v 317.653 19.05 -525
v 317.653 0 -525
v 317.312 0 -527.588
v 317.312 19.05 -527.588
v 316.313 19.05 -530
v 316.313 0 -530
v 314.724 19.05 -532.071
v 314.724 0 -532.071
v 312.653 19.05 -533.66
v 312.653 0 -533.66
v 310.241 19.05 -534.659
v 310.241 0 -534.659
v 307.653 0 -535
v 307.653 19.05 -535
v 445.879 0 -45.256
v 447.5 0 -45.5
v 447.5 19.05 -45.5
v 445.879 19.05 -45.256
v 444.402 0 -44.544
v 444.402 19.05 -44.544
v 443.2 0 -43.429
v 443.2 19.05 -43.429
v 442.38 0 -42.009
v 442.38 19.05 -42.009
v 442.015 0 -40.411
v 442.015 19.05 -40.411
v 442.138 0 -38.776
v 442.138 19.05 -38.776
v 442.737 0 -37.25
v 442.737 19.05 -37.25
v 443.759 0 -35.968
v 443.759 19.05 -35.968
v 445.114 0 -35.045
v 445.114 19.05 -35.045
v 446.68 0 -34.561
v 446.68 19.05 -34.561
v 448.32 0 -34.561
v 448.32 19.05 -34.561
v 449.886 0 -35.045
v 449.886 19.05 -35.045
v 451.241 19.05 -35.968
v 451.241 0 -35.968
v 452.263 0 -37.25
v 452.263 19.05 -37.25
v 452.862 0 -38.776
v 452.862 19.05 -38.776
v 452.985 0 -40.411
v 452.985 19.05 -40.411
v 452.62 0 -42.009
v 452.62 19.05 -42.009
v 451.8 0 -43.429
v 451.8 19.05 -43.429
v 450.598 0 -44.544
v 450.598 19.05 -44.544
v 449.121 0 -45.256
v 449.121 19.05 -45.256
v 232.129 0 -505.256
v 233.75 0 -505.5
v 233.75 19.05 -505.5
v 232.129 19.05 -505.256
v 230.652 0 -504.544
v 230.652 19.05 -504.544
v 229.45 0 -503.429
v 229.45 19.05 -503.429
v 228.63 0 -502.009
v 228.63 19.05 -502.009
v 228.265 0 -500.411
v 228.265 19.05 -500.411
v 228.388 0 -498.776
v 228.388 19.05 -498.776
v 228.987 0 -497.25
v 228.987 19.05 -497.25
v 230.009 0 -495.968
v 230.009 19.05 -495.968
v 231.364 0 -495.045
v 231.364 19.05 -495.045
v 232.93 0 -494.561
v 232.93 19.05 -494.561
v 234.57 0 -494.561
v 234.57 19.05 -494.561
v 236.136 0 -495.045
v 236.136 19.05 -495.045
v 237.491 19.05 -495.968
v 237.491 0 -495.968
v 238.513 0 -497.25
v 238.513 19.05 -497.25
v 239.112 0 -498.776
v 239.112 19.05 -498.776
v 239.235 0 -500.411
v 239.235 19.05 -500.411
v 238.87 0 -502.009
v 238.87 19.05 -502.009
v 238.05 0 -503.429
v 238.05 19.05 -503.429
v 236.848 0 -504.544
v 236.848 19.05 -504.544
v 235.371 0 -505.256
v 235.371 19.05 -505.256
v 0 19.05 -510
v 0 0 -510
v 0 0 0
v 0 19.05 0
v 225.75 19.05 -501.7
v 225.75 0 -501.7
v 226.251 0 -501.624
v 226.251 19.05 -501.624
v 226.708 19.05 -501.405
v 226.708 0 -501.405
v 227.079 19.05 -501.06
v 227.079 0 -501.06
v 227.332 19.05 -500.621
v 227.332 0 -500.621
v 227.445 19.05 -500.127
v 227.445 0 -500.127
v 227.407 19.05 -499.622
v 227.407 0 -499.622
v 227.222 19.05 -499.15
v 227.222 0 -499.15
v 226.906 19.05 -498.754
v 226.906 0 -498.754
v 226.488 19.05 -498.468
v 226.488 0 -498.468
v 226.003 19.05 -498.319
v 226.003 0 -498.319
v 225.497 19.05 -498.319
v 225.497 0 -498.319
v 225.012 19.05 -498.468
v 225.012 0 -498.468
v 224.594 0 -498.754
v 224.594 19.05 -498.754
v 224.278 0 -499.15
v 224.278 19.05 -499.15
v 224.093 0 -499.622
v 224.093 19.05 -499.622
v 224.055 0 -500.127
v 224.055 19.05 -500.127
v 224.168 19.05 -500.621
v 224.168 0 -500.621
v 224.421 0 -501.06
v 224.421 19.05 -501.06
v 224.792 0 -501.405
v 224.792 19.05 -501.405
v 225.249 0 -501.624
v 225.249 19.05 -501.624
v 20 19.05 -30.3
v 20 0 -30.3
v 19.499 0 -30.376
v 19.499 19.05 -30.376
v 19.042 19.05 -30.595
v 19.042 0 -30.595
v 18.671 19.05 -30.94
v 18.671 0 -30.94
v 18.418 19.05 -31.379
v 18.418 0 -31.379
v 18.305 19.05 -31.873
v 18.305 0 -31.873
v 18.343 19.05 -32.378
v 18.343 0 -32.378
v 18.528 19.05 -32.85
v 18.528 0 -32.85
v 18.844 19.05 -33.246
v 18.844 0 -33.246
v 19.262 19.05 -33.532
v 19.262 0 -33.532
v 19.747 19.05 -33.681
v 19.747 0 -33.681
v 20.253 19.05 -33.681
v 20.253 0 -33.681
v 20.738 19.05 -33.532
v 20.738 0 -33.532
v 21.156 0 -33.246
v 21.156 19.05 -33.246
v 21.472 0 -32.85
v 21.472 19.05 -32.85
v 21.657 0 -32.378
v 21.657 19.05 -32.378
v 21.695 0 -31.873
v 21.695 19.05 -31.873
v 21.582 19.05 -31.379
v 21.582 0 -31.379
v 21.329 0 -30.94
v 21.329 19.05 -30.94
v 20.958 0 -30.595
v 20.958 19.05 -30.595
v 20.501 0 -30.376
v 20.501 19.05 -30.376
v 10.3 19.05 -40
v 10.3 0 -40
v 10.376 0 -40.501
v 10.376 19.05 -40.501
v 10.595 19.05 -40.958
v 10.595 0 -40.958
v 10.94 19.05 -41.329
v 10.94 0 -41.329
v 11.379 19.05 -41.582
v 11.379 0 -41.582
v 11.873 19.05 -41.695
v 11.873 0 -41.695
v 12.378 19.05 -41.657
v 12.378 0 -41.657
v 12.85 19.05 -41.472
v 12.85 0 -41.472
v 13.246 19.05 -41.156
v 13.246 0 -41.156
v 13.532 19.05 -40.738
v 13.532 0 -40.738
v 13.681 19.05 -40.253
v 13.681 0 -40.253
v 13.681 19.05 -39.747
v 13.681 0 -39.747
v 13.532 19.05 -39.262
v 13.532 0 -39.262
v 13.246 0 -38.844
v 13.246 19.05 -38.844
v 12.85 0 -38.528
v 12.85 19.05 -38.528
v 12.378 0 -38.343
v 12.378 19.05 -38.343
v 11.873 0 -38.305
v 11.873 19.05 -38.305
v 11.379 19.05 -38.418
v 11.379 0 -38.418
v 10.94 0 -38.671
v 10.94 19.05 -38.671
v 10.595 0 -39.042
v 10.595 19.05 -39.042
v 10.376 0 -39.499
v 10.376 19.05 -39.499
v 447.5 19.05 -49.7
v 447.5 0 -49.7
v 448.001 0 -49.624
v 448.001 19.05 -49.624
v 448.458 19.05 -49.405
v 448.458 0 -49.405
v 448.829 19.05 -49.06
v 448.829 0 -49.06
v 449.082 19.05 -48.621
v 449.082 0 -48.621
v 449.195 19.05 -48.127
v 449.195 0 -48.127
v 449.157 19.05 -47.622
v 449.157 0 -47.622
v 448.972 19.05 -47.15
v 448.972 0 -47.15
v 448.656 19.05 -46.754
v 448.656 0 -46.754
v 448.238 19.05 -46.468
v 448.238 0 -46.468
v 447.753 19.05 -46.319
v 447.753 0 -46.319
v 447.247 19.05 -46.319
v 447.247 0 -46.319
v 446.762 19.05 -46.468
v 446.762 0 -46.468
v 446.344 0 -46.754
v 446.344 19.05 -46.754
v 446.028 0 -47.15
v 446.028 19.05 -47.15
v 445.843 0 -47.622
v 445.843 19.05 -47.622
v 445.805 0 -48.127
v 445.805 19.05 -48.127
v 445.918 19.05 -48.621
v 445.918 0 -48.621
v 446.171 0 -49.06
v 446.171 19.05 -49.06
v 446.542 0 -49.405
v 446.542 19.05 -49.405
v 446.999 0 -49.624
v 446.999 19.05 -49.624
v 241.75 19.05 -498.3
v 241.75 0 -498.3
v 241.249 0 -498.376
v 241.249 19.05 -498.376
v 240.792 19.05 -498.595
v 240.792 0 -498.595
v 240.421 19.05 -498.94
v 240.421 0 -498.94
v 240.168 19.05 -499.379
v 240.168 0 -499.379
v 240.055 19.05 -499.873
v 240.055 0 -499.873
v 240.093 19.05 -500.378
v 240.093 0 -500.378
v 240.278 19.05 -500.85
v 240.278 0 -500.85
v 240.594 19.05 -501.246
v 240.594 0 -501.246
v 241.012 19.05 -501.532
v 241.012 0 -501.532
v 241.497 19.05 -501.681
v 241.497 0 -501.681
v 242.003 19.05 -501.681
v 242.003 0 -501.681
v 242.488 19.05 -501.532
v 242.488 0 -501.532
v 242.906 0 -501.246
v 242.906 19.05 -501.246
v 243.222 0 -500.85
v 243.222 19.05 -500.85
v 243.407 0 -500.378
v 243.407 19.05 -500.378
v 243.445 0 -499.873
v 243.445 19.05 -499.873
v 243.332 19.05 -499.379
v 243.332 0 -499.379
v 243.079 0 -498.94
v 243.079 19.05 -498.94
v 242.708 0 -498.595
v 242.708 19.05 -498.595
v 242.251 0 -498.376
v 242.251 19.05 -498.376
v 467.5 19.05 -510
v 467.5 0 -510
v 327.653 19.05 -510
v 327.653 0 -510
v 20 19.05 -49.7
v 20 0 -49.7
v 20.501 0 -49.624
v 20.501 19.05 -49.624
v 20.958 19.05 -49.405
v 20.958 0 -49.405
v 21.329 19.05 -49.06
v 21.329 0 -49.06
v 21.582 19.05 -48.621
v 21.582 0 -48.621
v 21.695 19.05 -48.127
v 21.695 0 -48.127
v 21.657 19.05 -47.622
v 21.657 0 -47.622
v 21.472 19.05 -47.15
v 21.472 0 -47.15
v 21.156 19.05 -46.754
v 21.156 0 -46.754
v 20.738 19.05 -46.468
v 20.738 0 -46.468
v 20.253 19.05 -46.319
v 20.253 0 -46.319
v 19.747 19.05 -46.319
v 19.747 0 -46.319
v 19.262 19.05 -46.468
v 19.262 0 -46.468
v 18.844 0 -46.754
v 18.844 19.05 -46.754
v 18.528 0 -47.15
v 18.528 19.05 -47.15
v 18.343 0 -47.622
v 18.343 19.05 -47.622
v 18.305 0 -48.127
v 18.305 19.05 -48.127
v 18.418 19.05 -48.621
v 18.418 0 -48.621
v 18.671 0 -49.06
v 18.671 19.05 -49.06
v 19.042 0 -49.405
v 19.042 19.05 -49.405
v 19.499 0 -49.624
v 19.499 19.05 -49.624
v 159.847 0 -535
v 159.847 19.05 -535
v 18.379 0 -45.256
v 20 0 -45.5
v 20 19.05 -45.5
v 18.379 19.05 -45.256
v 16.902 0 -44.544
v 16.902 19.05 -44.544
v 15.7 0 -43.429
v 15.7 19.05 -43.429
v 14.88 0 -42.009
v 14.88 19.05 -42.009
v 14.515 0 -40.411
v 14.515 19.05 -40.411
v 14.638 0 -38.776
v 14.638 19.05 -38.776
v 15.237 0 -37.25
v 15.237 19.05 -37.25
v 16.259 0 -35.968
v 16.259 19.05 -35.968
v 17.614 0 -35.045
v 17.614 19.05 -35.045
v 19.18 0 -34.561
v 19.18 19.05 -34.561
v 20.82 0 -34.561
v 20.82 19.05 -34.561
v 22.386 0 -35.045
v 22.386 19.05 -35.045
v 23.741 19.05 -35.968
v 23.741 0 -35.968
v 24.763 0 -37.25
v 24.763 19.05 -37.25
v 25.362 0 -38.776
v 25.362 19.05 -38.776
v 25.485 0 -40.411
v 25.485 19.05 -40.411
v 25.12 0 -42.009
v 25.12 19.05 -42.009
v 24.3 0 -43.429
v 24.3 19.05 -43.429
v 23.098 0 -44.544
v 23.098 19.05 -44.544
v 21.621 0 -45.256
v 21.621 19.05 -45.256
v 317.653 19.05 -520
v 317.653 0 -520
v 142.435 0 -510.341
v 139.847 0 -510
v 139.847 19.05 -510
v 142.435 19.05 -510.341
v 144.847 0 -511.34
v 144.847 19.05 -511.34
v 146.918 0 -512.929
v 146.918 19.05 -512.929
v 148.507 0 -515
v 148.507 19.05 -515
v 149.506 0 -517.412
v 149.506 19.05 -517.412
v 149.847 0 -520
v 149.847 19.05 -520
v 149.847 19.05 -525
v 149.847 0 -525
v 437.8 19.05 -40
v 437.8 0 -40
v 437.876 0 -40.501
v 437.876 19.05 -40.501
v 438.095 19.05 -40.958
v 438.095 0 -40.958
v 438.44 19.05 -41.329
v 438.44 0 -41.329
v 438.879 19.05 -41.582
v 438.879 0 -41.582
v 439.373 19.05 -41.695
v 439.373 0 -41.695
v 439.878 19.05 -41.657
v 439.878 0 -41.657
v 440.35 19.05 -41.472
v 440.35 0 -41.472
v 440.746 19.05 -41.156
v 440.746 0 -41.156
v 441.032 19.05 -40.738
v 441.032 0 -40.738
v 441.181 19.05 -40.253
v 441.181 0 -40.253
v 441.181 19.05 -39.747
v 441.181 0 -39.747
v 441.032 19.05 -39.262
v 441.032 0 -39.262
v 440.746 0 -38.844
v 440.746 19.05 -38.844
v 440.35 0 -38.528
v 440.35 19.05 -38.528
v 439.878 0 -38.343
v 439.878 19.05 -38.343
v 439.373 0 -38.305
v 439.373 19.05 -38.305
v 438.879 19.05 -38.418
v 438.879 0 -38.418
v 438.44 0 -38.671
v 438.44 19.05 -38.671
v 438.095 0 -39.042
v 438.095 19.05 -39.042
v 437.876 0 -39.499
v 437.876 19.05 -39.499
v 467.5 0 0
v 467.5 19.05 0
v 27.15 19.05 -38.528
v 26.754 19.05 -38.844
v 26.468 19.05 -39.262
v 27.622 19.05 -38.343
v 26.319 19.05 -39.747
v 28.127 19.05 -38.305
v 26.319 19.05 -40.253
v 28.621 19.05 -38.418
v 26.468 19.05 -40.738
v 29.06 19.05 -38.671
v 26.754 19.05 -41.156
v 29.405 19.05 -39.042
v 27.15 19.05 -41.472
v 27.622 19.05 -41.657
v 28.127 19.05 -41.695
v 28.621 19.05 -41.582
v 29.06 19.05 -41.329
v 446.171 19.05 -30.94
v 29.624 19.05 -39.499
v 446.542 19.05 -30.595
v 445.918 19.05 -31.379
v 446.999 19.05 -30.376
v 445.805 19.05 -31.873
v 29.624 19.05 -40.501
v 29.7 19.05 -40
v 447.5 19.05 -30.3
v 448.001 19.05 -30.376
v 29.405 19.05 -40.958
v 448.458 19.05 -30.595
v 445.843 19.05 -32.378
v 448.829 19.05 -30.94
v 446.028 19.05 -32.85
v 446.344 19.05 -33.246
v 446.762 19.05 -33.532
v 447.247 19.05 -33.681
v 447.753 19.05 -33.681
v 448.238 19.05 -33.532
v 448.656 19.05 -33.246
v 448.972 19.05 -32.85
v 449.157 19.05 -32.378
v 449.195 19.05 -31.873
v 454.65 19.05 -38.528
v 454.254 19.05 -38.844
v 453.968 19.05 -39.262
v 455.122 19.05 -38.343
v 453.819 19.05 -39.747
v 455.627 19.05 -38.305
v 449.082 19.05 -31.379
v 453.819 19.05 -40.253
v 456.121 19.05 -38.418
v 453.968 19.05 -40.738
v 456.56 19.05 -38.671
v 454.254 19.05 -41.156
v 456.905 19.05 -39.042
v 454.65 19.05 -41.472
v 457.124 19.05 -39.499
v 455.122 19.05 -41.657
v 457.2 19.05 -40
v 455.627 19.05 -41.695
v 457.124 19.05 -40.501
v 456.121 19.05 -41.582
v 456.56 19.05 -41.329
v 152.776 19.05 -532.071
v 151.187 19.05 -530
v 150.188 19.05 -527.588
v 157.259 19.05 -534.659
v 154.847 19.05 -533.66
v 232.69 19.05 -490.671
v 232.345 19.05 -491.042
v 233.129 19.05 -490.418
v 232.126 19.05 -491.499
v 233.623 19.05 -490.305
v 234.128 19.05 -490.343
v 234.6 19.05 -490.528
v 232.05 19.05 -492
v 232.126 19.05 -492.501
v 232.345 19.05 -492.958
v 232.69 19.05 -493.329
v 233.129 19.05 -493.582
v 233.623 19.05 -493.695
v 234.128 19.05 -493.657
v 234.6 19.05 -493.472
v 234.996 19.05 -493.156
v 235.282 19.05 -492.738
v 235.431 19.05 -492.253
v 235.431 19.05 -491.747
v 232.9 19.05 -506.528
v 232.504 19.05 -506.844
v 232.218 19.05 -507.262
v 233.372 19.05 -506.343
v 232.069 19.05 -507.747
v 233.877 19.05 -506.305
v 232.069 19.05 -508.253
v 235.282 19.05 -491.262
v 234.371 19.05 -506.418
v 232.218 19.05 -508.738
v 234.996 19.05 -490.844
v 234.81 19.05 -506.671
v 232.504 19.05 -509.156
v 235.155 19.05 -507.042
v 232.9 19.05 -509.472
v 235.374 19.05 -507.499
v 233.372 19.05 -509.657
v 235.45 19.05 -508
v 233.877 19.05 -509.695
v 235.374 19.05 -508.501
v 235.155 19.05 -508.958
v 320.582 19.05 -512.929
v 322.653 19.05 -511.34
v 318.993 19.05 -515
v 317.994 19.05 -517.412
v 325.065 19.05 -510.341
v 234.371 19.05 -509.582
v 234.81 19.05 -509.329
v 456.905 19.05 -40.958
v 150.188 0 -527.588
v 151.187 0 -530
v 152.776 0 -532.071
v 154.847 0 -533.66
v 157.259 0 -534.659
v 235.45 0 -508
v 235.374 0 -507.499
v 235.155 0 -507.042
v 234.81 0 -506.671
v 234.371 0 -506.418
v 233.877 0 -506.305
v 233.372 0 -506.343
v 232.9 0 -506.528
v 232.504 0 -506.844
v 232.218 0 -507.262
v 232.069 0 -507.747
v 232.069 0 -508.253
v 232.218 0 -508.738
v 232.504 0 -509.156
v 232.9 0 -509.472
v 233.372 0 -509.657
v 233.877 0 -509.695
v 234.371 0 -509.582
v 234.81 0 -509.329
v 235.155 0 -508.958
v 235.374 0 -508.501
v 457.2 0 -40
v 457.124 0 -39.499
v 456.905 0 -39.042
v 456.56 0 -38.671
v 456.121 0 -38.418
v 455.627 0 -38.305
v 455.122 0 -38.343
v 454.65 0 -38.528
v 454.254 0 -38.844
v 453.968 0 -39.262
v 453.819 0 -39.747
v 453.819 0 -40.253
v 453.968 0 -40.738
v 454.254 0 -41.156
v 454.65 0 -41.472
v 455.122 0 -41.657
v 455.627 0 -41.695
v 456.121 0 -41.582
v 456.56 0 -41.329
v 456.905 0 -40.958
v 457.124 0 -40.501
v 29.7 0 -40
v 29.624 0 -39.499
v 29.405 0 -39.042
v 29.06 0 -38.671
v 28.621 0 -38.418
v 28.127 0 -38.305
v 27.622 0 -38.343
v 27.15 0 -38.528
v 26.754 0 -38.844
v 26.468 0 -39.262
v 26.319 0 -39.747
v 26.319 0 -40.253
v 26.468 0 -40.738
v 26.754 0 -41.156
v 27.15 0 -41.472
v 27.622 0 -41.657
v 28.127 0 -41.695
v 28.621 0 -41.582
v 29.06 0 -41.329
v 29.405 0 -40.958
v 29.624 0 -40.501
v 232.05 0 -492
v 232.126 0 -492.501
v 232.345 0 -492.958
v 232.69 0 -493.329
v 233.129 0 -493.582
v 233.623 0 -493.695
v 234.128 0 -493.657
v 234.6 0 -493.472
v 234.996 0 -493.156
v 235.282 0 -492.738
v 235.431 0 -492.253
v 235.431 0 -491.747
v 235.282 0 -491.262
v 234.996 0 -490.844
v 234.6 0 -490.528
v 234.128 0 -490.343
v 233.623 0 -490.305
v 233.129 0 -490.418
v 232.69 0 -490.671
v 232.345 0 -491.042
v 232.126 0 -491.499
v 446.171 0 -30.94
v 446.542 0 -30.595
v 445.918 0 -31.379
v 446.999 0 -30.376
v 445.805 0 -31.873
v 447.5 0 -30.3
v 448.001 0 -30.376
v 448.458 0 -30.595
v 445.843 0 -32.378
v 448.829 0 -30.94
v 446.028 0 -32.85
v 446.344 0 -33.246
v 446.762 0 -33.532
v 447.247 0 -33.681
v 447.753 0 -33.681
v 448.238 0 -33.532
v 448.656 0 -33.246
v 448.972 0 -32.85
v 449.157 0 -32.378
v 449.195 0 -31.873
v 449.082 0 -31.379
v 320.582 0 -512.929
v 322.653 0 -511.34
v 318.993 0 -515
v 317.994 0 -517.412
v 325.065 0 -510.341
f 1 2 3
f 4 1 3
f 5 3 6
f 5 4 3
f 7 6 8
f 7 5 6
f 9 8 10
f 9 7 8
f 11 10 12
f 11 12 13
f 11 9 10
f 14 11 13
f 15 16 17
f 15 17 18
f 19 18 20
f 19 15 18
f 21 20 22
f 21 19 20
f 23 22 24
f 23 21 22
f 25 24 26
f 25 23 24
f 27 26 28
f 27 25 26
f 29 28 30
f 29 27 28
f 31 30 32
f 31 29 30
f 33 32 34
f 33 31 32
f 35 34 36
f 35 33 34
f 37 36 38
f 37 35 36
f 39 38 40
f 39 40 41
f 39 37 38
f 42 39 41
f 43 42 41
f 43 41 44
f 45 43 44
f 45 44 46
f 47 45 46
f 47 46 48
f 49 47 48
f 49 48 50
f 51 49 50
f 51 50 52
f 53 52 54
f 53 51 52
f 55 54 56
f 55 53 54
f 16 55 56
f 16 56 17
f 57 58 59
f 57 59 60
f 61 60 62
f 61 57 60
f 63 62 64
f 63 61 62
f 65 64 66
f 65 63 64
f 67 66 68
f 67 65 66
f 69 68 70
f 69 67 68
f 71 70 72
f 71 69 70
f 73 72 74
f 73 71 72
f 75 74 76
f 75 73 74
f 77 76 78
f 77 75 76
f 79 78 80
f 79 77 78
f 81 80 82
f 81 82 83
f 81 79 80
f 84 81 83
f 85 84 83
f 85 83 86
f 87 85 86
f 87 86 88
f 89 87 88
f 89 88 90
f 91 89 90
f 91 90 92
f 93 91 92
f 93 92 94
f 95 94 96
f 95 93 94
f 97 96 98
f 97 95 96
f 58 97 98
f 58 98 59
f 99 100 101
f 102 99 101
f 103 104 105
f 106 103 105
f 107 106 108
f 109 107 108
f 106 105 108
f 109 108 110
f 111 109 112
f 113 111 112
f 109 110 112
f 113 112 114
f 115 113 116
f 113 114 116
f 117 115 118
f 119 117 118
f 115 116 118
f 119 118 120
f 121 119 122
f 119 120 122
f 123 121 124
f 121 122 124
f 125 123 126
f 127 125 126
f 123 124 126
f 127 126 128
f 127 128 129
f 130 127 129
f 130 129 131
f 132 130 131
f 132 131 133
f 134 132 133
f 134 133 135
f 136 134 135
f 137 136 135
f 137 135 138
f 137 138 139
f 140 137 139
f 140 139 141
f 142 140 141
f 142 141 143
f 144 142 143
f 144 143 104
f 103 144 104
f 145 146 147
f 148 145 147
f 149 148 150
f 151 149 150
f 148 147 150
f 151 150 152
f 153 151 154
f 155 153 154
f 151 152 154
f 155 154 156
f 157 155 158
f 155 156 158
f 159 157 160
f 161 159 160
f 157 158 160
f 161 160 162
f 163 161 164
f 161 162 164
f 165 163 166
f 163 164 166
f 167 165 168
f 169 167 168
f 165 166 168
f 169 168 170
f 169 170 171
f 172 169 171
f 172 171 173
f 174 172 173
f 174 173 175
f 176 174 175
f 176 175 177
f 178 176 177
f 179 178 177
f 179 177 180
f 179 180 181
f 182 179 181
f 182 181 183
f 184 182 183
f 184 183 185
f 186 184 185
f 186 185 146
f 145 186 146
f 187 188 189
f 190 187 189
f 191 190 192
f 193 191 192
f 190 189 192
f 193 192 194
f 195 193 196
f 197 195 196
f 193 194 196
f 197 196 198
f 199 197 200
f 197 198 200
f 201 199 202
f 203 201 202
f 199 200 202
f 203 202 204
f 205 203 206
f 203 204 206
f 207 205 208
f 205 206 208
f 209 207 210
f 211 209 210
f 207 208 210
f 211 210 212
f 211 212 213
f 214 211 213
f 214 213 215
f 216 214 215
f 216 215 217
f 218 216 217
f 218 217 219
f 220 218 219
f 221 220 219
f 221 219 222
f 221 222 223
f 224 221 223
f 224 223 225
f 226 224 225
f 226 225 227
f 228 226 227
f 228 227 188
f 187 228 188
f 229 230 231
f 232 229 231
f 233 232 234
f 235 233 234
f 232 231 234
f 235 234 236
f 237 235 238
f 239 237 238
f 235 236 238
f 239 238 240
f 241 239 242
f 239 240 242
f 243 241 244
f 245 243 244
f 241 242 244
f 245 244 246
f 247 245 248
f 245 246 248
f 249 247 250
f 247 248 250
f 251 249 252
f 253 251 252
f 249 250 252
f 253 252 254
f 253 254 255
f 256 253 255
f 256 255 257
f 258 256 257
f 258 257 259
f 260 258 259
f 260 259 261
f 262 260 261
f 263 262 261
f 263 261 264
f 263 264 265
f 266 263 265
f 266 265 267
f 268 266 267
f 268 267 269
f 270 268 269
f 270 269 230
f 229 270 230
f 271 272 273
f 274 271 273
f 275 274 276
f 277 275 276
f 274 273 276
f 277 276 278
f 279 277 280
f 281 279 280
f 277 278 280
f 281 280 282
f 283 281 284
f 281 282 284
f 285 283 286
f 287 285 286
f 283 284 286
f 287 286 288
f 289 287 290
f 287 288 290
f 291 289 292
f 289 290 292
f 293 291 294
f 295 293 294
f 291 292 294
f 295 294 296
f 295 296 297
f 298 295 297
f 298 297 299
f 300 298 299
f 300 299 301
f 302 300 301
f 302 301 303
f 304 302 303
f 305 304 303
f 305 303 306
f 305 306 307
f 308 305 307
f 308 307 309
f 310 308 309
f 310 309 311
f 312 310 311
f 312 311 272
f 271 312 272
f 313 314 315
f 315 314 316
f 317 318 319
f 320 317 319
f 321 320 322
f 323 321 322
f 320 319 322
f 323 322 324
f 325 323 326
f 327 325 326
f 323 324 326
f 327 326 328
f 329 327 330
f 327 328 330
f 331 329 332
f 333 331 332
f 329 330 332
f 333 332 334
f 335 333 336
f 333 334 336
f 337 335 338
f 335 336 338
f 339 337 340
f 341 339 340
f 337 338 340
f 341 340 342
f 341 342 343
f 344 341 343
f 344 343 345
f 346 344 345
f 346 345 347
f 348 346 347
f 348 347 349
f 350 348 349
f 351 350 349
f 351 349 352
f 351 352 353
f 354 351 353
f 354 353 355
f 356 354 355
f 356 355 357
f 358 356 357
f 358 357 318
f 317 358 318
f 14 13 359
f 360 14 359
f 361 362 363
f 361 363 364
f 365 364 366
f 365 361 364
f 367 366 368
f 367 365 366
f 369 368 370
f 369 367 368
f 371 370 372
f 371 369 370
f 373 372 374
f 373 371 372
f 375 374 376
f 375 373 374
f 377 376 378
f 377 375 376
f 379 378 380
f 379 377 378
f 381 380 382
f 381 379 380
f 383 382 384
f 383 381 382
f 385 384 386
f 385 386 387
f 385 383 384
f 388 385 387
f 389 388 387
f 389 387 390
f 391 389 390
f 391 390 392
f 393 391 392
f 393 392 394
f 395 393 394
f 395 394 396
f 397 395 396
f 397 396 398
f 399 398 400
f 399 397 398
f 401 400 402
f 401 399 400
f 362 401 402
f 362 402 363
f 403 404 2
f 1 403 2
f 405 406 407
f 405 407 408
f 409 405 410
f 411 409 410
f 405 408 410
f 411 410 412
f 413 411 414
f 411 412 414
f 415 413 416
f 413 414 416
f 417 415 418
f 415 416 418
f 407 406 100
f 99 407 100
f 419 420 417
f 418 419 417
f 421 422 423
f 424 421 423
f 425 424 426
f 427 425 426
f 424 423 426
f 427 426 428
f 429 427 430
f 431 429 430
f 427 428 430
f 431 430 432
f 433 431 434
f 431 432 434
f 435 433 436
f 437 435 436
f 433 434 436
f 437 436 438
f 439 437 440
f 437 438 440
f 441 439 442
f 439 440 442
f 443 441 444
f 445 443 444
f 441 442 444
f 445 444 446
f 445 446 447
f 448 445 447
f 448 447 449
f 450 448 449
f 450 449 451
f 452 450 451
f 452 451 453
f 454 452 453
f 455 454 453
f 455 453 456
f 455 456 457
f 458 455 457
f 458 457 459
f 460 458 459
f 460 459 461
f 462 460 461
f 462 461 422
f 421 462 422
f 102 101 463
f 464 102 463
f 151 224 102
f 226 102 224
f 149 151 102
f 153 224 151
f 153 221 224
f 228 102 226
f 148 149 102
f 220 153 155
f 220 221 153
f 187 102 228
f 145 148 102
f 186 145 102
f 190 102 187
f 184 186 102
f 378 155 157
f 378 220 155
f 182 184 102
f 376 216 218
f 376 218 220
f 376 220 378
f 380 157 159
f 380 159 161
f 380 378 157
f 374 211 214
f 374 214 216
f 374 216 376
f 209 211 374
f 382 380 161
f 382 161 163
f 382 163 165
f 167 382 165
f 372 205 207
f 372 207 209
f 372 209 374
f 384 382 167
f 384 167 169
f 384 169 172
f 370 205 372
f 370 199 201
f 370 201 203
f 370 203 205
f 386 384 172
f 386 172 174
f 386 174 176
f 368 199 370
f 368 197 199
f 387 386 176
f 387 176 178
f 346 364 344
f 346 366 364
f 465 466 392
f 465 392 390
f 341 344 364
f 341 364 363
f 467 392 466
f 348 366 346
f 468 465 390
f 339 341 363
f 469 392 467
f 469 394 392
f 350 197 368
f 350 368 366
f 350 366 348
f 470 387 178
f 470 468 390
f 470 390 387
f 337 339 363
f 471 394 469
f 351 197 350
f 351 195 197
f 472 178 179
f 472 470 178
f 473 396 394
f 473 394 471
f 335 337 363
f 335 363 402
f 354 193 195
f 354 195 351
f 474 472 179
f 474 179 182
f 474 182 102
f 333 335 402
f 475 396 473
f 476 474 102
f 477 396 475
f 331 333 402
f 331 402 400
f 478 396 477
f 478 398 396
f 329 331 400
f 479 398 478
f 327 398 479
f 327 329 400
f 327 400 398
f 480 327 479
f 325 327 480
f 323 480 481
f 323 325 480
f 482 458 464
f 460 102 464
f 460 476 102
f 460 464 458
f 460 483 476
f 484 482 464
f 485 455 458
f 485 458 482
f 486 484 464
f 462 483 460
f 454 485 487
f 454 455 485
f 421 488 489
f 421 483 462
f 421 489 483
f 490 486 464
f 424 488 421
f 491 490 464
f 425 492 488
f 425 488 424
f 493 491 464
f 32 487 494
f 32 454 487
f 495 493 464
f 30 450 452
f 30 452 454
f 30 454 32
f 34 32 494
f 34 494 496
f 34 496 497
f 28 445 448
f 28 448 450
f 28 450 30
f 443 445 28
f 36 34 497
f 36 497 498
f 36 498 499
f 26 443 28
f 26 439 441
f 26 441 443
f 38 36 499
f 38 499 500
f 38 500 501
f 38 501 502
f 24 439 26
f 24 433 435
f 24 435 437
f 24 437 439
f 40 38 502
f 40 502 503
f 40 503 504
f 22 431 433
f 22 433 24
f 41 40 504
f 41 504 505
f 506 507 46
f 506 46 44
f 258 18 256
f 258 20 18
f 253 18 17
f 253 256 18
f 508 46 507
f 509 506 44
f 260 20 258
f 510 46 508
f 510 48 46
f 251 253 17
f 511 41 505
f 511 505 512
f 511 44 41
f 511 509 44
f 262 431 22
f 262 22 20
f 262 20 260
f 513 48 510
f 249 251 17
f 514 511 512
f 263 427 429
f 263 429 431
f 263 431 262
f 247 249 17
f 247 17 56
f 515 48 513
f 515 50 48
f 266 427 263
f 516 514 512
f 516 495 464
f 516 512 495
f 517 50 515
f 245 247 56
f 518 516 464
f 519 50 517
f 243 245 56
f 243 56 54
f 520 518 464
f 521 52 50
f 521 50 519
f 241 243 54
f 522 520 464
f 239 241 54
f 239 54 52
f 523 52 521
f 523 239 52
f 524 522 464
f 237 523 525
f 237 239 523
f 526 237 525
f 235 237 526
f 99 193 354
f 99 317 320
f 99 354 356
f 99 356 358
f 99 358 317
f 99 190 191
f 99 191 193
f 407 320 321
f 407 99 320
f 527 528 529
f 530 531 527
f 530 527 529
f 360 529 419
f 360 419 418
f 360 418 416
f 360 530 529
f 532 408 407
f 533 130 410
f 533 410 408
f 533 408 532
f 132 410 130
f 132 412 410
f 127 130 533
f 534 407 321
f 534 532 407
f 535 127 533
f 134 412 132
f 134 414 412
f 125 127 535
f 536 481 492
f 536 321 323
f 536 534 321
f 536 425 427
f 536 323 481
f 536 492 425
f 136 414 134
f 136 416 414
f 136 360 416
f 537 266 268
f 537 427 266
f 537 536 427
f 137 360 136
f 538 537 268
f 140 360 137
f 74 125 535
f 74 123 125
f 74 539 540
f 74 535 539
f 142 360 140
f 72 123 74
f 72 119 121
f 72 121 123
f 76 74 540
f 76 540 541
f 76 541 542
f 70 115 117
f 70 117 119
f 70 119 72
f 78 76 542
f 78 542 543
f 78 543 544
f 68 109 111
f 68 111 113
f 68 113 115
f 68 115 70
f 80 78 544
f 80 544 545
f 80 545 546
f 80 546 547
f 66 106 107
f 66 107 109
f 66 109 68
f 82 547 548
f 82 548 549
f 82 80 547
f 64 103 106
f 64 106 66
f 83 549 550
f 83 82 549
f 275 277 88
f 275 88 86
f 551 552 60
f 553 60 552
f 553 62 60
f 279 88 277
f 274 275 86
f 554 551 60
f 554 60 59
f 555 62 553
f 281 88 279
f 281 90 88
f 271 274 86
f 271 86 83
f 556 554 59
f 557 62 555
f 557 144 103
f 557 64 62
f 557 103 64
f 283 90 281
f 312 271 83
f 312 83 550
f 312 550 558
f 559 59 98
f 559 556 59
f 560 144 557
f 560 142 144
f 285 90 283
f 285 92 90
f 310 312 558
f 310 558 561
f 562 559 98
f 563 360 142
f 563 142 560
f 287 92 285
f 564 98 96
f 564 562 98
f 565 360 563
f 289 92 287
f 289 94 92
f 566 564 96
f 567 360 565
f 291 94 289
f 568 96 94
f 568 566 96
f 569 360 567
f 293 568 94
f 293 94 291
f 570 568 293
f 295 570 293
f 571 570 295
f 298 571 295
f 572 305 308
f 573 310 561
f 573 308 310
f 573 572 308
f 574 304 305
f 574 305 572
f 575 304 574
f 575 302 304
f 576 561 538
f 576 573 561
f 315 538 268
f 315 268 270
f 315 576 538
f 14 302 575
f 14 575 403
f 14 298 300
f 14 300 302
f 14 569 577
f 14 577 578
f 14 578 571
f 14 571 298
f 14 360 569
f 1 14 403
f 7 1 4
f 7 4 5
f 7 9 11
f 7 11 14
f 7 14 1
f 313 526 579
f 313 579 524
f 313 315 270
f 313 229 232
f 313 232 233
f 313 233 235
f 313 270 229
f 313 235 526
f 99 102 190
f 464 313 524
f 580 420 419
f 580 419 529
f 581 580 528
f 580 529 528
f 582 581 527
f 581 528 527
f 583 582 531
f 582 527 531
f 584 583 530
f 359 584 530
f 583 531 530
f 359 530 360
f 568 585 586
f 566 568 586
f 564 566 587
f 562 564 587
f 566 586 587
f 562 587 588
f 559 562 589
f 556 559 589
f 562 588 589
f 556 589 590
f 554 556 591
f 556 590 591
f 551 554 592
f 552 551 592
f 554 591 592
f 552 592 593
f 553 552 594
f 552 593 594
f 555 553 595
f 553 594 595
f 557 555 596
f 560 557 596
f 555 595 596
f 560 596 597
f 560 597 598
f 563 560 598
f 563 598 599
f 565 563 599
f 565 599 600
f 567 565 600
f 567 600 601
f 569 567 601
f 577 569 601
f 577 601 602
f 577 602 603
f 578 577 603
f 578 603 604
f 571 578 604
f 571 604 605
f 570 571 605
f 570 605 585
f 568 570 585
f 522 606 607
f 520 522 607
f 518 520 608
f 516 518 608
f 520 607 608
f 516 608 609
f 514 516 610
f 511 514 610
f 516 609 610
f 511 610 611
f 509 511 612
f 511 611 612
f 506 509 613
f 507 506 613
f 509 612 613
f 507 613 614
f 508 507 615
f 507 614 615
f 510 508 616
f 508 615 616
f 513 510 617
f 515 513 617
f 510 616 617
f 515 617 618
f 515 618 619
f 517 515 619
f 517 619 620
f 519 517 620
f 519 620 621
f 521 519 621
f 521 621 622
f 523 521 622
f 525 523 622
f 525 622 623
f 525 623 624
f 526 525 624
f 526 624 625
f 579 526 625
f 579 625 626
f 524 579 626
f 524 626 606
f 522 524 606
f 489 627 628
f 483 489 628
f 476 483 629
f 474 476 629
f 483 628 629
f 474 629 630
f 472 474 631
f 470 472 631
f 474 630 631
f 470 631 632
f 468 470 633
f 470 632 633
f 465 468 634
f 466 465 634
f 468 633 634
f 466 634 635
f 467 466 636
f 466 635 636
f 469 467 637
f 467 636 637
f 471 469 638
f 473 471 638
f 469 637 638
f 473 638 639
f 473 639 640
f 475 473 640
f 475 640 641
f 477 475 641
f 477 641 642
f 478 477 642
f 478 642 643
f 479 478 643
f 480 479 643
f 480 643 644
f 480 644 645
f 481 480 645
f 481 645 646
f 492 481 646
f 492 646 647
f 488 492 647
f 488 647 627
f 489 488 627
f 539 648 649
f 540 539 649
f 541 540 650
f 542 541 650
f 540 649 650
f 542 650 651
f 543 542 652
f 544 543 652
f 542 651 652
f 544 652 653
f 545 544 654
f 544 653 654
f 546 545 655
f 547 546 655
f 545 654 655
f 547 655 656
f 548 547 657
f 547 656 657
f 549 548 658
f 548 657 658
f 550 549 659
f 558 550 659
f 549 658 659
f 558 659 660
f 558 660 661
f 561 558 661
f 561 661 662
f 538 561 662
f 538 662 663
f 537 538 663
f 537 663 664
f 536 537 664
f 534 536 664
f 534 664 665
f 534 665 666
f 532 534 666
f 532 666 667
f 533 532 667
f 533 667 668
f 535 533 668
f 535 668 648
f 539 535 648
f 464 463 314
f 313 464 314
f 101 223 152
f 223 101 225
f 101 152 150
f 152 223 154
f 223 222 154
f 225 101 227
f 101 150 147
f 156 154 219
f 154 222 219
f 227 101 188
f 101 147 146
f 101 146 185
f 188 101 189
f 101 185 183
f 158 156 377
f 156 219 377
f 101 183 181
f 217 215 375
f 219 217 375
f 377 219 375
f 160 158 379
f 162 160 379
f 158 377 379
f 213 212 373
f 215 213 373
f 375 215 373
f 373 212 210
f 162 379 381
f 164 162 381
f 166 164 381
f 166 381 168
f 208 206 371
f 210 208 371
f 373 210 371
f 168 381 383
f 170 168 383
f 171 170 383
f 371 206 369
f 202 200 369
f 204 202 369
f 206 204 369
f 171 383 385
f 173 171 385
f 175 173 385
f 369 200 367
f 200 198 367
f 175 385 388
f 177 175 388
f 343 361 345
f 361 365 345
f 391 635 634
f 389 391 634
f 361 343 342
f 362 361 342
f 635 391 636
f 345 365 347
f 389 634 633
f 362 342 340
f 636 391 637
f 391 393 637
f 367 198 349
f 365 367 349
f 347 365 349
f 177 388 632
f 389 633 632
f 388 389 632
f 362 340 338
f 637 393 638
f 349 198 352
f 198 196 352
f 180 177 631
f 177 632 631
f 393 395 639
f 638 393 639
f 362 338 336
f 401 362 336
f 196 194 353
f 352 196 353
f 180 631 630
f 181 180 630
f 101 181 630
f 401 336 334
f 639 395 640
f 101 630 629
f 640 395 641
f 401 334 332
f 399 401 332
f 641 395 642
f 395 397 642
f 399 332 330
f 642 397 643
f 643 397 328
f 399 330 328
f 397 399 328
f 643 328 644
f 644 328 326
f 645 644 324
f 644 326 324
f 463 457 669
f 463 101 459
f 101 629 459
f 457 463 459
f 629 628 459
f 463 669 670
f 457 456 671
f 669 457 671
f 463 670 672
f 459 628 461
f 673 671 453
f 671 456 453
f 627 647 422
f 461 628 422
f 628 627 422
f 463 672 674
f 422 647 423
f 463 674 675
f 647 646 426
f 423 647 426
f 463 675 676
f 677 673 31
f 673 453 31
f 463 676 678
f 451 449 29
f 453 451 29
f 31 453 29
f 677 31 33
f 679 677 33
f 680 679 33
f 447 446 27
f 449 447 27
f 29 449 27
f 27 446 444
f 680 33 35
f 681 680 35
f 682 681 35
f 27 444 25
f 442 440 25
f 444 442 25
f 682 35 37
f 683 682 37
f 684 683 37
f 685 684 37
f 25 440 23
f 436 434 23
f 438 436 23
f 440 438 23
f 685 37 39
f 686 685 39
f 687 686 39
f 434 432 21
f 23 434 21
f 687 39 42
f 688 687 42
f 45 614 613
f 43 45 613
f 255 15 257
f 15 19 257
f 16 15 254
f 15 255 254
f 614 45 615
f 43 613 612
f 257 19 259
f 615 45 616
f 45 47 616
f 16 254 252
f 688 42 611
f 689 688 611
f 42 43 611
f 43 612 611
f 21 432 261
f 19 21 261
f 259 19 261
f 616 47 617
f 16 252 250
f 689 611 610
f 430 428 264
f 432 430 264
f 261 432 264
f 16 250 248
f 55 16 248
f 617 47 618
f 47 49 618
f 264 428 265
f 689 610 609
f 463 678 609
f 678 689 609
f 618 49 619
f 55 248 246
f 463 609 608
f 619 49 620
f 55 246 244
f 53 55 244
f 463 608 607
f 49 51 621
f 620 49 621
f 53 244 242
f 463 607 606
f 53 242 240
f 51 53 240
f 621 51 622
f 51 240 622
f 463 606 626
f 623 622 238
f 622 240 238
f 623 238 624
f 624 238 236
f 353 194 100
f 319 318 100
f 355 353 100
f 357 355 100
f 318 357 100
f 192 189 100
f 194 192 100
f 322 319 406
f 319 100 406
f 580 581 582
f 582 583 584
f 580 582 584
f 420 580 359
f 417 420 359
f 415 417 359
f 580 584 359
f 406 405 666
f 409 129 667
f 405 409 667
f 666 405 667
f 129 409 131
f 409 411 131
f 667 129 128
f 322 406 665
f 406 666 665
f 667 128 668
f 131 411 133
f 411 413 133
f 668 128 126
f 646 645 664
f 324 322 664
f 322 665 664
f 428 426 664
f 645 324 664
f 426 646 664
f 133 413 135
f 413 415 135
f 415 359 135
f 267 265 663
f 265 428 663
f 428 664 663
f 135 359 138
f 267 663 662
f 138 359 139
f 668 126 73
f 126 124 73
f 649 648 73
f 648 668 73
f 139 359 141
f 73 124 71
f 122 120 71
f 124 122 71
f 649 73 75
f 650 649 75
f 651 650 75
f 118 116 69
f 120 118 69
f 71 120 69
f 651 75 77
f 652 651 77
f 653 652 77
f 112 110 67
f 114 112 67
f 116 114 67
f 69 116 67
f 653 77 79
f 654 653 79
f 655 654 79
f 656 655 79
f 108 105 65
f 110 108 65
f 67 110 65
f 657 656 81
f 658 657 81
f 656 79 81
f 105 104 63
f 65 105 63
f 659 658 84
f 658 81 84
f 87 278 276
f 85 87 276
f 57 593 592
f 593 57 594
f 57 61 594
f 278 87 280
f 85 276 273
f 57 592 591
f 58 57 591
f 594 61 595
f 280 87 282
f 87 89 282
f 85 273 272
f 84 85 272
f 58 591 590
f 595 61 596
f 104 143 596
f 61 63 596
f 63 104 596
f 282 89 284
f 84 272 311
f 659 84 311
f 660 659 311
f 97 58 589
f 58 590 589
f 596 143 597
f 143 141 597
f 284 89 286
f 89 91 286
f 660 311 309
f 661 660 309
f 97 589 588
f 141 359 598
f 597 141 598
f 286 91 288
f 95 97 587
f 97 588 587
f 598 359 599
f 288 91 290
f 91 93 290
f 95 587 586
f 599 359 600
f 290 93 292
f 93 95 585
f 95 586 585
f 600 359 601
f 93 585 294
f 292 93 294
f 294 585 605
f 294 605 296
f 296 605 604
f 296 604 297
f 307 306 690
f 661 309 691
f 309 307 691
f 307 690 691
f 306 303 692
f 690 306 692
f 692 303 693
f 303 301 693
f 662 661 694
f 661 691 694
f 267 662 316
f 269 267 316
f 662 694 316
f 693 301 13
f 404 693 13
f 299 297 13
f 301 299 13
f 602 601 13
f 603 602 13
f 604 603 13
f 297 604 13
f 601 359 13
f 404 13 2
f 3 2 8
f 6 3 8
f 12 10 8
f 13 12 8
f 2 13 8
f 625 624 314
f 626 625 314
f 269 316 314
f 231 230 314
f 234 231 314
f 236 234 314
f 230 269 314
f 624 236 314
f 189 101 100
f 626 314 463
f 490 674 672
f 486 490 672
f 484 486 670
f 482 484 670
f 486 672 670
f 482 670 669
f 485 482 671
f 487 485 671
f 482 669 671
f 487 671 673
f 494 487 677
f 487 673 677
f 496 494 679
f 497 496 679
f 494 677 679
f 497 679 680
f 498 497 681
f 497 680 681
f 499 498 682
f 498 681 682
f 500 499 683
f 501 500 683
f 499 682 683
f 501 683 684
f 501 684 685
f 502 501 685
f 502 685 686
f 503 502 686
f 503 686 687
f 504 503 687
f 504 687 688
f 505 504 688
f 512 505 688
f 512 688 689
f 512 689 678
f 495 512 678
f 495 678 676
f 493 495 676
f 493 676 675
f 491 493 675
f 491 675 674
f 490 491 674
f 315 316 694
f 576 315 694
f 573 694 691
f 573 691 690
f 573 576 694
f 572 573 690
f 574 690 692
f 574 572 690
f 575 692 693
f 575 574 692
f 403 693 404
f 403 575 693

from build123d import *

# Parameters (mm, degrees)
SKETCH2_R            = 5.5
BOSS_EXTRUDE1_DEPTH  = 19.05
M3_CLEARANCE_HOLE1_D = 3.4
CIRPATTERN1_COUNT    = 4
FILLET1_R            = 10
M3_CLEARANCE_HOLE2_D = 3.4
CIRPATTERN2_COUNT    = 4
M3_CLEARANCE_HOLE3_D = 3.4
CIRPATTERN3_COUNT    = 4


with BuildPart() as part:
    # Sketch2 → Boss-Extrude1 (new body)
    with BuildSketch(Plane(origin=(0, 0, 0), x_dir=(1, 0, 0), z_dir=(0, 1, 0))):
        Polygon((0, 0), (467.5, 0), (467.5, 510), (317.652811453, 510), (317.652811453, 535), (149.847188547, 535), (149.847188547, 510), (0, 510), align=None)
        with Locations(Location((233.75, 500, 0), (0, 0, 90))):
            Circle(SKETCH2_R, mode=Mode.SUBTRACT)
        with Locations(Location((20, 40, 0), (0, 0, 90))):
            Circle(SKETCH2_R, mode=Mode.SUBTRACT)
        with Locations(Location((447.5, 40, 0), (0, 0, 90))):
            Circle(SKETCH2_R, mode=Mode.SUBTRACT)
    extrude(amount=BOSS_EXTRUDE1_DEPTH)

    # M3 Clearance Hole1 (through all)
    with Locations(Plane(origin=(225.75, 19.05, -500), x_dir=(0, 0, 1), z_dir=(0, 1, 0))):
        with Locations((0, 0)):
            m3_clearance_hole1 = Hole(M3_CLEARANCE_HOLE1_D / 2)

    # CirPattern1: M3 Clearance Hole1 ×4 about axis
    cirpattern1_axis = Axis((233.75, 0, -500), (0, 1, 0))
    for i in range(1, CIRPATTERN1_COUNT):
        add(m3_clearance_hole1.rotate(cirpattern1_axis, i * 360 / CIRPATTERN1_COUNT), mode=Mode.SUBTRACT)

    # Fillet1
    fillet1_edges = [part.edges().sort_by_distance(p)[0] for p in [
        (149.847188547, 9.525, -510),
        (149.847188547, 9.525, -535),
        (317.652811453, 9.525, -535),
        (317.652811453, 9.525, -510),
    ]]
    fillet(fillet1_edges, radius=FILLET1_R)

    # M3 Clearance Hole2 (through all)
    with Locations(Plane(origin=(20, 19.05, -48), x_dir=(0, 0, 1), z_dir=(0, 1, 0))):
        with Locations((0, 0)):
            m3_clearance_hole2 = Hole(M3_CLEARANCE_HOLE2_D / 2)

    # CirPattern2: M3 Clearance Hole2 ×4 about axis
    cirpattern2_axis = Axis((20, 0, -40), (0, 1, 0))
    for i in range(1, CIRPATTERN2_COUNT):
        add(m3_clearance_hole2.rotate(cirpattern2_axis, i * 360 / CIRPATTERN2_COUNT), mode=Mode.SUBTRACT)

    # M3 Clearance Hole3 (through all)
    with Locations(Plane(origin=(447.5, 19.05, -48), x_dir=(0, 0, 1), z_dir=(0, 1, 0))):
        with Locations((0, 0)):
            m3_clearance_hole3 = Hole(M3_CLEARANCE_HOLE3_D / 2)

    # CirPattern3: M3 Clearance Hole3 ×4 about axis
    cirpattern3_axis = Axis((447.5, 0, -40), (0, 1, 0))
    for i in range(1, CIRPATTERN3_COUNT):
        add(m3_clearance_hole3.rotate(cirpattern3_axis, i * 360 / CIRPATTERN3_COUNT), mode=Mode.SUBTRACT)


solid = part.part
